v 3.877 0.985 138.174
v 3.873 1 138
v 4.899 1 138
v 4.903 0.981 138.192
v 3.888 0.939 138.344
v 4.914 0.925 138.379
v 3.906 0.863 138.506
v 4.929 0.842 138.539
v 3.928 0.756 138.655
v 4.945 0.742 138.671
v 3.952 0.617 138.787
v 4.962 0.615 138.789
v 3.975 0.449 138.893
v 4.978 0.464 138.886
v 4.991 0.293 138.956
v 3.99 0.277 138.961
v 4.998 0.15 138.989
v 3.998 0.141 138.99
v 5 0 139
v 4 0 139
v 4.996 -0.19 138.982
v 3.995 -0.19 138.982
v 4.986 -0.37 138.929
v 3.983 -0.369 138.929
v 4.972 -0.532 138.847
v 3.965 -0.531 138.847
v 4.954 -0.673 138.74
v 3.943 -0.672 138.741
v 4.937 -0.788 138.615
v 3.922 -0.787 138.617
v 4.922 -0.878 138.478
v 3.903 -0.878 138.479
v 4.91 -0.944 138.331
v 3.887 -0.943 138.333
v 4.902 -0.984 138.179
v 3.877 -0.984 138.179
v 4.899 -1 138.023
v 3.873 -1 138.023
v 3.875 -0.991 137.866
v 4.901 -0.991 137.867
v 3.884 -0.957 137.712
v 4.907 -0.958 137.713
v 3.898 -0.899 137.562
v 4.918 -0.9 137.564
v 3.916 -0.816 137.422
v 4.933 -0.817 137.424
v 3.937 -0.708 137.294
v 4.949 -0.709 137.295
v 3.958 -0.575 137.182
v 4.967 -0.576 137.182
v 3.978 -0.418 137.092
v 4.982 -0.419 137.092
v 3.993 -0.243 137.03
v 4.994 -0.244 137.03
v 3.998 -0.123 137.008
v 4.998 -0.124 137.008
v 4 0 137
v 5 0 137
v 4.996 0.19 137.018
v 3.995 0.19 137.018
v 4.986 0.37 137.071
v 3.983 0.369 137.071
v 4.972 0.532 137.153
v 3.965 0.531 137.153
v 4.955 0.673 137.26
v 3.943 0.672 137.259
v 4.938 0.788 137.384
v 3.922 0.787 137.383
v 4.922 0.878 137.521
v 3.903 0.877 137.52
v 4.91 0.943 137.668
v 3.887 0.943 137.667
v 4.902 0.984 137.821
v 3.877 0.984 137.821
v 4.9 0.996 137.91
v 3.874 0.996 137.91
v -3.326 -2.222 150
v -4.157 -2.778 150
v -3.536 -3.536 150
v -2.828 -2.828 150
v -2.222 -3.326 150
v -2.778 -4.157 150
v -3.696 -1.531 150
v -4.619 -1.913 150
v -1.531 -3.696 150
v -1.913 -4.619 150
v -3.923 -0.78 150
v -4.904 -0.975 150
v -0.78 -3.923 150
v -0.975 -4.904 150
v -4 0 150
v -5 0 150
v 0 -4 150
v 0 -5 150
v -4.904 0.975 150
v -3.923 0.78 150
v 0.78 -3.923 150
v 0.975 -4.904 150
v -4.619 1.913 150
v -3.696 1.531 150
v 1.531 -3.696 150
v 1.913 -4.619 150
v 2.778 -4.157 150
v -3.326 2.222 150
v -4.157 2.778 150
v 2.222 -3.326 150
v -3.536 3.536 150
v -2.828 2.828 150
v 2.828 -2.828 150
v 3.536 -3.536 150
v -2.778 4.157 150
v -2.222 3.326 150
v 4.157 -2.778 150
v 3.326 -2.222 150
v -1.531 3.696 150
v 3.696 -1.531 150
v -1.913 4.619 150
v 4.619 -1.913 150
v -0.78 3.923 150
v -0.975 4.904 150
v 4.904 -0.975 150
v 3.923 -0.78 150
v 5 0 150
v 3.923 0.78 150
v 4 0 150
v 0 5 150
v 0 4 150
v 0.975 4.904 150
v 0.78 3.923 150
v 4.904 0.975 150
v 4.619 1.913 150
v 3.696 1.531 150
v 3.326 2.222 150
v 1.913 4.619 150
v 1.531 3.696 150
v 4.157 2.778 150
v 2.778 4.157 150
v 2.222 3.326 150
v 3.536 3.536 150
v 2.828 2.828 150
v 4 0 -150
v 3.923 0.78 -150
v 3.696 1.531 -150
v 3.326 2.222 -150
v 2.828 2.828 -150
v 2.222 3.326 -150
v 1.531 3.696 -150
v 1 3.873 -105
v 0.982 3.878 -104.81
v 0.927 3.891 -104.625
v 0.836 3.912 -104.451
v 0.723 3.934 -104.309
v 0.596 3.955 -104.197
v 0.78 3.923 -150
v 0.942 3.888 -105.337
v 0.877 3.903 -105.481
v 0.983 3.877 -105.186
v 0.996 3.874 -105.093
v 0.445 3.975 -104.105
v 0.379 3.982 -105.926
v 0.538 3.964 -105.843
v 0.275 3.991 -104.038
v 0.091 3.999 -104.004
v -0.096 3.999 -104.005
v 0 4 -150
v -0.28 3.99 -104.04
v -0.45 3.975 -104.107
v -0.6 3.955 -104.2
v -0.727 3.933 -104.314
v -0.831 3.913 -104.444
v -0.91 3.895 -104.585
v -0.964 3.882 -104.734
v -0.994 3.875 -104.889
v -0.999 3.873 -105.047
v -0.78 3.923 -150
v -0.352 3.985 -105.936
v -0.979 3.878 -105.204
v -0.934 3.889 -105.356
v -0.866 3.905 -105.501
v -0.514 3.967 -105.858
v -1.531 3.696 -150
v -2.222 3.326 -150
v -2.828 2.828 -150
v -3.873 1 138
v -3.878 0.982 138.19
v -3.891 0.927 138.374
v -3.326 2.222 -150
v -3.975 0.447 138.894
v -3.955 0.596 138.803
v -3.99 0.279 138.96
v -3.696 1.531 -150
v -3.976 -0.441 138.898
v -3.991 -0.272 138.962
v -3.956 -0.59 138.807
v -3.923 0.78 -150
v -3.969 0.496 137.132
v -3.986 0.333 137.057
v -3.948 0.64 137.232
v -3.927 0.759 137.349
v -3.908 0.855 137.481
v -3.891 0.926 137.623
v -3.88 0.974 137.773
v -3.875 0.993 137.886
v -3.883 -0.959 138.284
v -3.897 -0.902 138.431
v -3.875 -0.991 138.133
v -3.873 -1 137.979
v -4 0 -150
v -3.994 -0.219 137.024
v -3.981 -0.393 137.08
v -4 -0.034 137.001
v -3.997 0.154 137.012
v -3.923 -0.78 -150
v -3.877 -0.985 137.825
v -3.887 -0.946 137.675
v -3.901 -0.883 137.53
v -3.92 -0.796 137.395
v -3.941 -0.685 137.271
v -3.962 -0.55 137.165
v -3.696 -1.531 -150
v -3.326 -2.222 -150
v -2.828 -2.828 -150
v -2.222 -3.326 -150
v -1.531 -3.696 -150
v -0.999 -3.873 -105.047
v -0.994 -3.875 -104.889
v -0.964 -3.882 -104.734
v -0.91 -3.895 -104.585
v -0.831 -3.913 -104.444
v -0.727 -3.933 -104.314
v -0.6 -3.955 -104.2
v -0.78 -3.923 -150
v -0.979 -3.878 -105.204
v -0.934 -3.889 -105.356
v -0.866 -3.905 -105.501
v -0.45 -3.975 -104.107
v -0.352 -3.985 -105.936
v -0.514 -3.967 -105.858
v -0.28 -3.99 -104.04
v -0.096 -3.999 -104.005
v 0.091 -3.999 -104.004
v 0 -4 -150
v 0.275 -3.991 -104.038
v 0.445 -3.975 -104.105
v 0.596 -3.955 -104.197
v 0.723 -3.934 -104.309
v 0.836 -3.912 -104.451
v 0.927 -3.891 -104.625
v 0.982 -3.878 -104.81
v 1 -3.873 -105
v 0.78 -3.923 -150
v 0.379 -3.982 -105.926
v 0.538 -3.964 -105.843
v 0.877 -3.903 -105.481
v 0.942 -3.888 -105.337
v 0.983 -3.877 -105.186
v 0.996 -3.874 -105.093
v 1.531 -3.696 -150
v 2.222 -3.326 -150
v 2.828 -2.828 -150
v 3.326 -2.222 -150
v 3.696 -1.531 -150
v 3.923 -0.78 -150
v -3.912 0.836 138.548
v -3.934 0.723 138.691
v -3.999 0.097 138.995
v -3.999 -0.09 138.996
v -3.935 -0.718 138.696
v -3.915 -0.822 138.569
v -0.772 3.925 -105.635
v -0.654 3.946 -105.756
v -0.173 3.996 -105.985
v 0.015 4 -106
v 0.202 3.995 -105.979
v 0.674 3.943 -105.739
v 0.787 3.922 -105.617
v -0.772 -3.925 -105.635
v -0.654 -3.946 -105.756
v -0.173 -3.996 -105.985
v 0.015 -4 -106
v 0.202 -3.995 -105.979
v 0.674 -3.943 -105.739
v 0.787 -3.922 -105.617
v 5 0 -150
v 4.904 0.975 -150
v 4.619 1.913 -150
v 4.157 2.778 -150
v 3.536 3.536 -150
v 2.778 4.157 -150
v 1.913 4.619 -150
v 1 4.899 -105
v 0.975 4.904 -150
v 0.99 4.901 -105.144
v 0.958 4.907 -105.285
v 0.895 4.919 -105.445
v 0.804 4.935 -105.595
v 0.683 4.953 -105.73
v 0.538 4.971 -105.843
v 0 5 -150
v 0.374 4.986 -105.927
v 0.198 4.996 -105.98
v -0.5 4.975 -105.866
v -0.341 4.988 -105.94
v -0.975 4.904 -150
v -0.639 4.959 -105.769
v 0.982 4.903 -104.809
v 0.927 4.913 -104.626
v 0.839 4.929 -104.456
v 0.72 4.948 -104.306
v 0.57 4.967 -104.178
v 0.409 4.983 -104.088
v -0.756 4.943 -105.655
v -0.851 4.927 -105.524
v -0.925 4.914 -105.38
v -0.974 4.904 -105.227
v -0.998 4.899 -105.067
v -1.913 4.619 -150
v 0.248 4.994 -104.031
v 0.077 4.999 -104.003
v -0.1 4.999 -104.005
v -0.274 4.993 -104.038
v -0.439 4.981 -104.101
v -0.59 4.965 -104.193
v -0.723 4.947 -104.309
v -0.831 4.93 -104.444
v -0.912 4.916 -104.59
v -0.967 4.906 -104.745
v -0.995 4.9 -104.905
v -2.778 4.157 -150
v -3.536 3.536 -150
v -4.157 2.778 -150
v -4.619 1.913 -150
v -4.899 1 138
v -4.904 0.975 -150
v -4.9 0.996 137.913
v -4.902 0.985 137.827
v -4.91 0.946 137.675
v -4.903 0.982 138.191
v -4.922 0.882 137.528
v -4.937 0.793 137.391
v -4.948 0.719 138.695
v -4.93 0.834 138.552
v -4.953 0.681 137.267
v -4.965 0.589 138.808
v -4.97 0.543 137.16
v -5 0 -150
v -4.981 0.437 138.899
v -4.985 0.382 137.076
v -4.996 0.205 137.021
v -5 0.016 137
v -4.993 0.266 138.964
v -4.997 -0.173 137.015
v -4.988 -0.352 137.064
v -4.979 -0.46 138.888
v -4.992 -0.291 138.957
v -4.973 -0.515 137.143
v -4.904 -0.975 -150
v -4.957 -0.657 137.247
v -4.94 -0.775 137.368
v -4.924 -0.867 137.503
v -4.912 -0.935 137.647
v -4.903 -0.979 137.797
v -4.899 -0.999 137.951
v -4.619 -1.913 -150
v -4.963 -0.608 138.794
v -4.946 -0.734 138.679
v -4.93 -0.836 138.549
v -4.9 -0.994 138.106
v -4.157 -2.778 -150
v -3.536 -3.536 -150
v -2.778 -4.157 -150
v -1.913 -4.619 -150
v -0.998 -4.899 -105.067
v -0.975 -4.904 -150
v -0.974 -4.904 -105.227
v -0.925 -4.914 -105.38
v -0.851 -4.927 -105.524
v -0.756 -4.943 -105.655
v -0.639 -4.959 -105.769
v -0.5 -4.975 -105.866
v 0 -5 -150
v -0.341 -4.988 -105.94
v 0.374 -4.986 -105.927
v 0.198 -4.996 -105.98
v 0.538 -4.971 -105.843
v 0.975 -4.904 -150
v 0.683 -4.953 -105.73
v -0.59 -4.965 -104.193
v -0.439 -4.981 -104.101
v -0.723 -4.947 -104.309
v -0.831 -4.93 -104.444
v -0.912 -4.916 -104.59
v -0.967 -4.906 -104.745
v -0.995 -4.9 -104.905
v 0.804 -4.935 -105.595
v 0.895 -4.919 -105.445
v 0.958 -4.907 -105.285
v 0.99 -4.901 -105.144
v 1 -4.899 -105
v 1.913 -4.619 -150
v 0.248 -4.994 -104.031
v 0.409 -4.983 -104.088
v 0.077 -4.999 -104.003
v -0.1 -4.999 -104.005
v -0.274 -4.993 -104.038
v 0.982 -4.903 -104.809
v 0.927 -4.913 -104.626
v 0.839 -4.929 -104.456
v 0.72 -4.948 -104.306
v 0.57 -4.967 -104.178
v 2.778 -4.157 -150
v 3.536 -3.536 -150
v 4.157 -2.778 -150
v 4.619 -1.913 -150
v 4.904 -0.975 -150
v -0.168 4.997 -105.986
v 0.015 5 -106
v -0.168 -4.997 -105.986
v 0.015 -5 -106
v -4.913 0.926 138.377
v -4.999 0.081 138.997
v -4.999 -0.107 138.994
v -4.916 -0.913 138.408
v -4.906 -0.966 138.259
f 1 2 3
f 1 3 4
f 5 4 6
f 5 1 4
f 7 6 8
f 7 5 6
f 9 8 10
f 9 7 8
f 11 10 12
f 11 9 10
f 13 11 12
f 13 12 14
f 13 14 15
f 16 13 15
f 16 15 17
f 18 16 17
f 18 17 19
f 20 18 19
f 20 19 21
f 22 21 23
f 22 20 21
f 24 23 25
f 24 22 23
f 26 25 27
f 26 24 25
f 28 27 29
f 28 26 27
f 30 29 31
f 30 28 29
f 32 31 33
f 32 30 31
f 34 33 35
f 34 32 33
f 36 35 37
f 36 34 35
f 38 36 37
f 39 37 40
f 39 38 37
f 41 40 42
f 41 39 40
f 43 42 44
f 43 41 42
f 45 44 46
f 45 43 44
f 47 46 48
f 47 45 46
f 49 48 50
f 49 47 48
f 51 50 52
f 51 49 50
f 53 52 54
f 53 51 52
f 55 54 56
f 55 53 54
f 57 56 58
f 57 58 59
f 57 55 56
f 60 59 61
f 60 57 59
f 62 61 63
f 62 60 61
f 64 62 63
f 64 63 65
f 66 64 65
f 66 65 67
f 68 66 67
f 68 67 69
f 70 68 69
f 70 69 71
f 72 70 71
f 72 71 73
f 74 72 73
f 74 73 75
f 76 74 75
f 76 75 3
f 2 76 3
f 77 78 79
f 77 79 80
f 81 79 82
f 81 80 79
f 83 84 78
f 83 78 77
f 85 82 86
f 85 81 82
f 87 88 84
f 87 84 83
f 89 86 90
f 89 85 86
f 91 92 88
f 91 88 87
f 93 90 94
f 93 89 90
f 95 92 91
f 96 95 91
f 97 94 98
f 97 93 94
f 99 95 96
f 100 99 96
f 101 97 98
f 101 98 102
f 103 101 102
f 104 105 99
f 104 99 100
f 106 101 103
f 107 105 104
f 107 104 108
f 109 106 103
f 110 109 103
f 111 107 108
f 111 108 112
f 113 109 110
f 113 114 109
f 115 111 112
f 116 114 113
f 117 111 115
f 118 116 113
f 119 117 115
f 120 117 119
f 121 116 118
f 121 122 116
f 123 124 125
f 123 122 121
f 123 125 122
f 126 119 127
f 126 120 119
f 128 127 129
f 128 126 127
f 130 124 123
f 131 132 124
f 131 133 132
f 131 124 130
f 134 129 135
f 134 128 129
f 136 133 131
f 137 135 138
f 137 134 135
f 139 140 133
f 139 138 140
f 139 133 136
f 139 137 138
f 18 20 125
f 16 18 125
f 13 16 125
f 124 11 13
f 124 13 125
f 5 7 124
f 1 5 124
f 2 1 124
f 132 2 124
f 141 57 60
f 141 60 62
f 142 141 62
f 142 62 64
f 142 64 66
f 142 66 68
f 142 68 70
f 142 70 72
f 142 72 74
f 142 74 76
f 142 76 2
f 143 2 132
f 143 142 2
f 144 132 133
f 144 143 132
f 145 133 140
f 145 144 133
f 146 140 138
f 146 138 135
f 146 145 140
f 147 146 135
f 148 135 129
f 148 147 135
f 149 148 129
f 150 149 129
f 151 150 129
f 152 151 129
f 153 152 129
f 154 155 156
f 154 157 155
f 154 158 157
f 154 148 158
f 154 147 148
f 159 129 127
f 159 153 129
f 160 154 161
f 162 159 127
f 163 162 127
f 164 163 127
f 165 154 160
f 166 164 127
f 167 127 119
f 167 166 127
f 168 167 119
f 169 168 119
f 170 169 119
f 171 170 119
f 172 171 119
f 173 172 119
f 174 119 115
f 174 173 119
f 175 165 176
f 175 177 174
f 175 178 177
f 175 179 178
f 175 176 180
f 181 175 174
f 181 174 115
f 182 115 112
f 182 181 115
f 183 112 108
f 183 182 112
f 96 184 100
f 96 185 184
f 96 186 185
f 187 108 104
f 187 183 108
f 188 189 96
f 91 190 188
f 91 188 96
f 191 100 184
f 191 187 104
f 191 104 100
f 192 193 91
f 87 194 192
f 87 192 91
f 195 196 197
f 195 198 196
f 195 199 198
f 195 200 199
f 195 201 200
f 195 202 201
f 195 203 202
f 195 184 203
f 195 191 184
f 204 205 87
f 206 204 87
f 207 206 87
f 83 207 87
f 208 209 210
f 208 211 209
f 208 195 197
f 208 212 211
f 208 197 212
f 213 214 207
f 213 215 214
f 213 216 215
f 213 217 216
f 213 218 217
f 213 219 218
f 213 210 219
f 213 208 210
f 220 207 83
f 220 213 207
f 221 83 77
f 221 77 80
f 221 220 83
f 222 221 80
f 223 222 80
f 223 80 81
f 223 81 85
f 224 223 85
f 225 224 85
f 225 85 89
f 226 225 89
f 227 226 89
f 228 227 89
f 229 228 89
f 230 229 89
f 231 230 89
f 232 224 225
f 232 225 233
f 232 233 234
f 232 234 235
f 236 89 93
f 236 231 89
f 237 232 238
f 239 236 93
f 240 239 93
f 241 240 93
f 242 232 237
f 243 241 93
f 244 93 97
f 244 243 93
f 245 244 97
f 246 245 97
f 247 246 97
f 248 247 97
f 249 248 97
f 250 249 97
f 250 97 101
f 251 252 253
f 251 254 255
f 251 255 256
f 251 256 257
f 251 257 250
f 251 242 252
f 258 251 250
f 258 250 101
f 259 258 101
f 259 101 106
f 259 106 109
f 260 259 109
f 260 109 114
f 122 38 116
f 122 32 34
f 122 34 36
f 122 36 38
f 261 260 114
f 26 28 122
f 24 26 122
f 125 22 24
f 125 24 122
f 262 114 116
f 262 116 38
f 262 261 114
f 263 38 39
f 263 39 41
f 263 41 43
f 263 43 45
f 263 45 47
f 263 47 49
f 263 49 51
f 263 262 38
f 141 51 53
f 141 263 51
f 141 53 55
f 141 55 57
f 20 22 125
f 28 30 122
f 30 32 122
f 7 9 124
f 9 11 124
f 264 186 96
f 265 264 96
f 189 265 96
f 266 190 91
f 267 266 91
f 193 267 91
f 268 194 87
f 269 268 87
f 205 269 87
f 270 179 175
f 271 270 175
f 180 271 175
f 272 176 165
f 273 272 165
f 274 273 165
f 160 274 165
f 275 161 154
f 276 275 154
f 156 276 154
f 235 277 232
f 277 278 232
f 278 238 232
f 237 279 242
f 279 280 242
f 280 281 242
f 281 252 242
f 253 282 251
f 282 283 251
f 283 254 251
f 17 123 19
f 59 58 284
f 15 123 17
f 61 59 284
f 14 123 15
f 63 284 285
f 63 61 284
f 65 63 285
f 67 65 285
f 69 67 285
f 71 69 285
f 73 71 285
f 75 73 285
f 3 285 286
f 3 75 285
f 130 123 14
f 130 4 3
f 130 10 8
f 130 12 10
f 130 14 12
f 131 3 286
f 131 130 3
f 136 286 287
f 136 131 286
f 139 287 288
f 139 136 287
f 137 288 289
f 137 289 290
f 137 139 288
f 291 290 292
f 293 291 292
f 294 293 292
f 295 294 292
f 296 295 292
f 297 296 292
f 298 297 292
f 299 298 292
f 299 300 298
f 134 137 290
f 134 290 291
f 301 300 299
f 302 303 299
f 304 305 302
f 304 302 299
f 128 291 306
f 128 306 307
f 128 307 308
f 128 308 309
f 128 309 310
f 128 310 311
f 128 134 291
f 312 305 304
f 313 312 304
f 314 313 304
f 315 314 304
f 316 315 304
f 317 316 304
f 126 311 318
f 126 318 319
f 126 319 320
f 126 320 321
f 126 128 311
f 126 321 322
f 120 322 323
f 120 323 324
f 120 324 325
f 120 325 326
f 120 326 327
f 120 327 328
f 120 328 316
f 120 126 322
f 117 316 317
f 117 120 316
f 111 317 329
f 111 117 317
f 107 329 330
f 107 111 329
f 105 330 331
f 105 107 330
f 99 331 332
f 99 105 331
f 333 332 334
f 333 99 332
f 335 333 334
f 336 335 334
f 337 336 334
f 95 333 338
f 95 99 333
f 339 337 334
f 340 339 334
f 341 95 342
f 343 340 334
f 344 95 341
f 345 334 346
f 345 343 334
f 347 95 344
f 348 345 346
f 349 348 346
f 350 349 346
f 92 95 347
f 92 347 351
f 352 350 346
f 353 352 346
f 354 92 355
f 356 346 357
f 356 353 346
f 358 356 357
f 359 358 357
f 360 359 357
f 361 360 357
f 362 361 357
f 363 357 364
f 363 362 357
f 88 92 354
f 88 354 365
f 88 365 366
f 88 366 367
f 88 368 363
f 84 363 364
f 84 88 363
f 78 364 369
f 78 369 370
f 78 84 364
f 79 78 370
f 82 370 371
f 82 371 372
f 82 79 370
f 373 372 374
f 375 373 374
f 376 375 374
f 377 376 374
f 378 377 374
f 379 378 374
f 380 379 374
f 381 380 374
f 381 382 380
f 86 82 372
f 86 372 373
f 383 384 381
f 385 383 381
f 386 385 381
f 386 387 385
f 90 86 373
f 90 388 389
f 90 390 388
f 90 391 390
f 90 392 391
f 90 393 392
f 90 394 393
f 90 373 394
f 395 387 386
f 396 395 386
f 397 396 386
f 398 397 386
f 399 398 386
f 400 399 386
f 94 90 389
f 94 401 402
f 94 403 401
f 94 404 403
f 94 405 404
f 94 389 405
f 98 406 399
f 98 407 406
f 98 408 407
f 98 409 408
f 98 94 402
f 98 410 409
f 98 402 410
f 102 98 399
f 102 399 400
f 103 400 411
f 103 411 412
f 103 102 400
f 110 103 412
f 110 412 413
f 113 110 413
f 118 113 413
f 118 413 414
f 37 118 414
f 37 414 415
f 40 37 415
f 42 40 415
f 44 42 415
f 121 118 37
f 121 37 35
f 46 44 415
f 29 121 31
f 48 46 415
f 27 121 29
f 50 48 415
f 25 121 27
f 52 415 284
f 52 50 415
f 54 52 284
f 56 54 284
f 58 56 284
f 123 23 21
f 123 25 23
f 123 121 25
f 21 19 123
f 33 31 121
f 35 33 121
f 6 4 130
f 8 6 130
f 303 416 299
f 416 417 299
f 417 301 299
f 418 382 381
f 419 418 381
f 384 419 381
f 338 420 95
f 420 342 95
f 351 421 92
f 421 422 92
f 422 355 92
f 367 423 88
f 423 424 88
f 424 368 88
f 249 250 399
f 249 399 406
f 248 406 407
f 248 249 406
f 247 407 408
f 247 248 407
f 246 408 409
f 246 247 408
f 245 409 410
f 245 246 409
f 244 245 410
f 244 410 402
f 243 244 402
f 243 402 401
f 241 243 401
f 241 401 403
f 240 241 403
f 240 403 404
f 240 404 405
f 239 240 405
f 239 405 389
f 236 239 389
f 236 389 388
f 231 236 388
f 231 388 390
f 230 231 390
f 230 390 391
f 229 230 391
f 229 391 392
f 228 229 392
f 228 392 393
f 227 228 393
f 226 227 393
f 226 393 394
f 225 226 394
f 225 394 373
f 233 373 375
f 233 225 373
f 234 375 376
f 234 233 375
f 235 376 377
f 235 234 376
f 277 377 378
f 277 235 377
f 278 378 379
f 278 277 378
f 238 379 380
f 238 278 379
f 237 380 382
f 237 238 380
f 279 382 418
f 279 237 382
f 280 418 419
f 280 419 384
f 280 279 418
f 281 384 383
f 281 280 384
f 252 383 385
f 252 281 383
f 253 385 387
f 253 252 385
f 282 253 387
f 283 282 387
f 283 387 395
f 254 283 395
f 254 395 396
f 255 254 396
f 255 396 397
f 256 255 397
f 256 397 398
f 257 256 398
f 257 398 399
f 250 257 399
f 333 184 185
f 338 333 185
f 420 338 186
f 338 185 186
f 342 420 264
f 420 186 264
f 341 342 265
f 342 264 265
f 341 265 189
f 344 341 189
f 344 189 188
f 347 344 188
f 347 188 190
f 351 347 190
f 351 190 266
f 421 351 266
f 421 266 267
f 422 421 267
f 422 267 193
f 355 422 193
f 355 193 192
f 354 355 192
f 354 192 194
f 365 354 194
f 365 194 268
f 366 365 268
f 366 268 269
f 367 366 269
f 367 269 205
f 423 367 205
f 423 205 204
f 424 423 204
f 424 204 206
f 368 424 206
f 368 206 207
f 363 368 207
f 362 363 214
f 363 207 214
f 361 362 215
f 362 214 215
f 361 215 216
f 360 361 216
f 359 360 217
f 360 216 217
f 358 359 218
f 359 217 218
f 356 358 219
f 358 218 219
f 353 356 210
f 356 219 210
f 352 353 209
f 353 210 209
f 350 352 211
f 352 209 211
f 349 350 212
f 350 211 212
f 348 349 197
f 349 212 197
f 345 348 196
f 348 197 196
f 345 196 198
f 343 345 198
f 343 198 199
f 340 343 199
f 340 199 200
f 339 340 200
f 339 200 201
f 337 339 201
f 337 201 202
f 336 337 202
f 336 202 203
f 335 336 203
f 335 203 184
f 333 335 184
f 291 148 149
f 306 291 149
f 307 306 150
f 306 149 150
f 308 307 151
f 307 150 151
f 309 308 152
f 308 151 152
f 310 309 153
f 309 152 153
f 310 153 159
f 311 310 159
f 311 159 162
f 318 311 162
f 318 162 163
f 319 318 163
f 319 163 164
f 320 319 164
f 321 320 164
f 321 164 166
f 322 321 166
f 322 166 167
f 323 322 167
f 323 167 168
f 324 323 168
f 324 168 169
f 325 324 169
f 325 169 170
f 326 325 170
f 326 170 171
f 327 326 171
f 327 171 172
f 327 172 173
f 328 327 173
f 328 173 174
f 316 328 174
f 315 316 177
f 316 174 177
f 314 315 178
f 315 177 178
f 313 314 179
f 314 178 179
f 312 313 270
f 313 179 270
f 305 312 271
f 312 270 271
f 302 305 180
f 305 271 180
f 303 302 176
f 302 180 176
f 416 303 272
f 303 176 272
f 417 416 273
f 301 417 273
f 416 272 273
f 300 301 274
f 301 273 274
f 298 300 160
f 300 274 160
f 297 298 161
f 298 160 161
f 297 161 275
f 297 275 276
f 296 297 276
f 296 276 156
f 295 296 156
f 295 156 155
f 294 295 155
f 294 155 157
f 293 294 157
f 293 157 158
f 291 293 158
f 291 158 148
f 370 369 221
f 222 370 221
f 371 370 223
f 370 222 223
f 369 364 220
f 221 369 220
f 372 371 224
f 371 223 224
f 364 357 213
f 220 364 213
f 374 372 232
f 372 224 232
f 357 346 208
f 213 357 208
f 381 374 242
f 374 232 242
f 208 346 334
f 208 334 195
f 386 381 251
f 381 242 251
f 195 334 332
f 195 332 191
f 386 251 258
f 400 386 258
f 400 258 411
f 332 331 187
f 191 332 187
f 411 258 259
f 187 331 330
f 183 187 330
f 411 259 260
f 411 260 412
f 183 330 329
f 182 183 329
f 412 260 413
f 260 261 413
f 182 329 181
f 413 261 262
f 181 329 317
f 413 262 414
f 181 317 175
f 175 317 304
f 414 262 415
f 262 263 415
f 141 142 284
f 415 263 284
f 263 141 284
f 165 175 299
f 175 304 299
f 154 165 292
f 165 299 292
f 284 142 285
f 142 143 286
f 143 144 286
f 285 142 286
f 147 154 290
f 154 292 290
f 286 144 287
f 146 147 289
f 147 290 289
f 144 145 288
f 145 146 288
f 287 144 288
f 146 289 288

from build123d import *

# Parameters (mm, degrees)
F0_R          = 5
F0_R_2        = 4
F1_DEPTH      = 150
F2_R          = 1
F3_DEPTH      = 5.001
F3_DEPTH_BACK = 5.001
F4_R          = 1
F5_DEPTH      = 5.0010001
F5_DEPTH_BACK = 5.0010001


with BuildPart() as f1:
    # F0 (on Top) → F1 (new body, symmetric)
    with BuildSketch(Plane.XY):
        Circle(F0_R)
        Circle(F0_R_2, mode=Mode.SUBTRACT)
    extrude(amount=F1_DEPTH, both=True)

    # F2 (on Front) → F3 (cut, two sides)
    with BuildSketch(Plane.XZ) as f3_sk:
        with Locations((0, -105)):
            Circle(F2_R)
    extrude(amount=-F3_DEPTH, mode=Mode.SUBTRACT)
    extrude(f3_sk.sketch, amount=F3_DEPTH_BACK, mode=Mode.SUBTRACT)

    # F4 (on Right) → F5 (cut, two sides)
    with BuildSketch(Plane.YZ) as f5_sk:
        with Locations((0, 138)):
            Circle(F4_R)
    extrude(amount=-F5_DEPTH, mode=Mode.SUBTRACT)
    extrude(f5_sk.sketch, amount=F5_DEPTH_BACK, mode=Mode.SUBTRACT)


solid = f1.part
